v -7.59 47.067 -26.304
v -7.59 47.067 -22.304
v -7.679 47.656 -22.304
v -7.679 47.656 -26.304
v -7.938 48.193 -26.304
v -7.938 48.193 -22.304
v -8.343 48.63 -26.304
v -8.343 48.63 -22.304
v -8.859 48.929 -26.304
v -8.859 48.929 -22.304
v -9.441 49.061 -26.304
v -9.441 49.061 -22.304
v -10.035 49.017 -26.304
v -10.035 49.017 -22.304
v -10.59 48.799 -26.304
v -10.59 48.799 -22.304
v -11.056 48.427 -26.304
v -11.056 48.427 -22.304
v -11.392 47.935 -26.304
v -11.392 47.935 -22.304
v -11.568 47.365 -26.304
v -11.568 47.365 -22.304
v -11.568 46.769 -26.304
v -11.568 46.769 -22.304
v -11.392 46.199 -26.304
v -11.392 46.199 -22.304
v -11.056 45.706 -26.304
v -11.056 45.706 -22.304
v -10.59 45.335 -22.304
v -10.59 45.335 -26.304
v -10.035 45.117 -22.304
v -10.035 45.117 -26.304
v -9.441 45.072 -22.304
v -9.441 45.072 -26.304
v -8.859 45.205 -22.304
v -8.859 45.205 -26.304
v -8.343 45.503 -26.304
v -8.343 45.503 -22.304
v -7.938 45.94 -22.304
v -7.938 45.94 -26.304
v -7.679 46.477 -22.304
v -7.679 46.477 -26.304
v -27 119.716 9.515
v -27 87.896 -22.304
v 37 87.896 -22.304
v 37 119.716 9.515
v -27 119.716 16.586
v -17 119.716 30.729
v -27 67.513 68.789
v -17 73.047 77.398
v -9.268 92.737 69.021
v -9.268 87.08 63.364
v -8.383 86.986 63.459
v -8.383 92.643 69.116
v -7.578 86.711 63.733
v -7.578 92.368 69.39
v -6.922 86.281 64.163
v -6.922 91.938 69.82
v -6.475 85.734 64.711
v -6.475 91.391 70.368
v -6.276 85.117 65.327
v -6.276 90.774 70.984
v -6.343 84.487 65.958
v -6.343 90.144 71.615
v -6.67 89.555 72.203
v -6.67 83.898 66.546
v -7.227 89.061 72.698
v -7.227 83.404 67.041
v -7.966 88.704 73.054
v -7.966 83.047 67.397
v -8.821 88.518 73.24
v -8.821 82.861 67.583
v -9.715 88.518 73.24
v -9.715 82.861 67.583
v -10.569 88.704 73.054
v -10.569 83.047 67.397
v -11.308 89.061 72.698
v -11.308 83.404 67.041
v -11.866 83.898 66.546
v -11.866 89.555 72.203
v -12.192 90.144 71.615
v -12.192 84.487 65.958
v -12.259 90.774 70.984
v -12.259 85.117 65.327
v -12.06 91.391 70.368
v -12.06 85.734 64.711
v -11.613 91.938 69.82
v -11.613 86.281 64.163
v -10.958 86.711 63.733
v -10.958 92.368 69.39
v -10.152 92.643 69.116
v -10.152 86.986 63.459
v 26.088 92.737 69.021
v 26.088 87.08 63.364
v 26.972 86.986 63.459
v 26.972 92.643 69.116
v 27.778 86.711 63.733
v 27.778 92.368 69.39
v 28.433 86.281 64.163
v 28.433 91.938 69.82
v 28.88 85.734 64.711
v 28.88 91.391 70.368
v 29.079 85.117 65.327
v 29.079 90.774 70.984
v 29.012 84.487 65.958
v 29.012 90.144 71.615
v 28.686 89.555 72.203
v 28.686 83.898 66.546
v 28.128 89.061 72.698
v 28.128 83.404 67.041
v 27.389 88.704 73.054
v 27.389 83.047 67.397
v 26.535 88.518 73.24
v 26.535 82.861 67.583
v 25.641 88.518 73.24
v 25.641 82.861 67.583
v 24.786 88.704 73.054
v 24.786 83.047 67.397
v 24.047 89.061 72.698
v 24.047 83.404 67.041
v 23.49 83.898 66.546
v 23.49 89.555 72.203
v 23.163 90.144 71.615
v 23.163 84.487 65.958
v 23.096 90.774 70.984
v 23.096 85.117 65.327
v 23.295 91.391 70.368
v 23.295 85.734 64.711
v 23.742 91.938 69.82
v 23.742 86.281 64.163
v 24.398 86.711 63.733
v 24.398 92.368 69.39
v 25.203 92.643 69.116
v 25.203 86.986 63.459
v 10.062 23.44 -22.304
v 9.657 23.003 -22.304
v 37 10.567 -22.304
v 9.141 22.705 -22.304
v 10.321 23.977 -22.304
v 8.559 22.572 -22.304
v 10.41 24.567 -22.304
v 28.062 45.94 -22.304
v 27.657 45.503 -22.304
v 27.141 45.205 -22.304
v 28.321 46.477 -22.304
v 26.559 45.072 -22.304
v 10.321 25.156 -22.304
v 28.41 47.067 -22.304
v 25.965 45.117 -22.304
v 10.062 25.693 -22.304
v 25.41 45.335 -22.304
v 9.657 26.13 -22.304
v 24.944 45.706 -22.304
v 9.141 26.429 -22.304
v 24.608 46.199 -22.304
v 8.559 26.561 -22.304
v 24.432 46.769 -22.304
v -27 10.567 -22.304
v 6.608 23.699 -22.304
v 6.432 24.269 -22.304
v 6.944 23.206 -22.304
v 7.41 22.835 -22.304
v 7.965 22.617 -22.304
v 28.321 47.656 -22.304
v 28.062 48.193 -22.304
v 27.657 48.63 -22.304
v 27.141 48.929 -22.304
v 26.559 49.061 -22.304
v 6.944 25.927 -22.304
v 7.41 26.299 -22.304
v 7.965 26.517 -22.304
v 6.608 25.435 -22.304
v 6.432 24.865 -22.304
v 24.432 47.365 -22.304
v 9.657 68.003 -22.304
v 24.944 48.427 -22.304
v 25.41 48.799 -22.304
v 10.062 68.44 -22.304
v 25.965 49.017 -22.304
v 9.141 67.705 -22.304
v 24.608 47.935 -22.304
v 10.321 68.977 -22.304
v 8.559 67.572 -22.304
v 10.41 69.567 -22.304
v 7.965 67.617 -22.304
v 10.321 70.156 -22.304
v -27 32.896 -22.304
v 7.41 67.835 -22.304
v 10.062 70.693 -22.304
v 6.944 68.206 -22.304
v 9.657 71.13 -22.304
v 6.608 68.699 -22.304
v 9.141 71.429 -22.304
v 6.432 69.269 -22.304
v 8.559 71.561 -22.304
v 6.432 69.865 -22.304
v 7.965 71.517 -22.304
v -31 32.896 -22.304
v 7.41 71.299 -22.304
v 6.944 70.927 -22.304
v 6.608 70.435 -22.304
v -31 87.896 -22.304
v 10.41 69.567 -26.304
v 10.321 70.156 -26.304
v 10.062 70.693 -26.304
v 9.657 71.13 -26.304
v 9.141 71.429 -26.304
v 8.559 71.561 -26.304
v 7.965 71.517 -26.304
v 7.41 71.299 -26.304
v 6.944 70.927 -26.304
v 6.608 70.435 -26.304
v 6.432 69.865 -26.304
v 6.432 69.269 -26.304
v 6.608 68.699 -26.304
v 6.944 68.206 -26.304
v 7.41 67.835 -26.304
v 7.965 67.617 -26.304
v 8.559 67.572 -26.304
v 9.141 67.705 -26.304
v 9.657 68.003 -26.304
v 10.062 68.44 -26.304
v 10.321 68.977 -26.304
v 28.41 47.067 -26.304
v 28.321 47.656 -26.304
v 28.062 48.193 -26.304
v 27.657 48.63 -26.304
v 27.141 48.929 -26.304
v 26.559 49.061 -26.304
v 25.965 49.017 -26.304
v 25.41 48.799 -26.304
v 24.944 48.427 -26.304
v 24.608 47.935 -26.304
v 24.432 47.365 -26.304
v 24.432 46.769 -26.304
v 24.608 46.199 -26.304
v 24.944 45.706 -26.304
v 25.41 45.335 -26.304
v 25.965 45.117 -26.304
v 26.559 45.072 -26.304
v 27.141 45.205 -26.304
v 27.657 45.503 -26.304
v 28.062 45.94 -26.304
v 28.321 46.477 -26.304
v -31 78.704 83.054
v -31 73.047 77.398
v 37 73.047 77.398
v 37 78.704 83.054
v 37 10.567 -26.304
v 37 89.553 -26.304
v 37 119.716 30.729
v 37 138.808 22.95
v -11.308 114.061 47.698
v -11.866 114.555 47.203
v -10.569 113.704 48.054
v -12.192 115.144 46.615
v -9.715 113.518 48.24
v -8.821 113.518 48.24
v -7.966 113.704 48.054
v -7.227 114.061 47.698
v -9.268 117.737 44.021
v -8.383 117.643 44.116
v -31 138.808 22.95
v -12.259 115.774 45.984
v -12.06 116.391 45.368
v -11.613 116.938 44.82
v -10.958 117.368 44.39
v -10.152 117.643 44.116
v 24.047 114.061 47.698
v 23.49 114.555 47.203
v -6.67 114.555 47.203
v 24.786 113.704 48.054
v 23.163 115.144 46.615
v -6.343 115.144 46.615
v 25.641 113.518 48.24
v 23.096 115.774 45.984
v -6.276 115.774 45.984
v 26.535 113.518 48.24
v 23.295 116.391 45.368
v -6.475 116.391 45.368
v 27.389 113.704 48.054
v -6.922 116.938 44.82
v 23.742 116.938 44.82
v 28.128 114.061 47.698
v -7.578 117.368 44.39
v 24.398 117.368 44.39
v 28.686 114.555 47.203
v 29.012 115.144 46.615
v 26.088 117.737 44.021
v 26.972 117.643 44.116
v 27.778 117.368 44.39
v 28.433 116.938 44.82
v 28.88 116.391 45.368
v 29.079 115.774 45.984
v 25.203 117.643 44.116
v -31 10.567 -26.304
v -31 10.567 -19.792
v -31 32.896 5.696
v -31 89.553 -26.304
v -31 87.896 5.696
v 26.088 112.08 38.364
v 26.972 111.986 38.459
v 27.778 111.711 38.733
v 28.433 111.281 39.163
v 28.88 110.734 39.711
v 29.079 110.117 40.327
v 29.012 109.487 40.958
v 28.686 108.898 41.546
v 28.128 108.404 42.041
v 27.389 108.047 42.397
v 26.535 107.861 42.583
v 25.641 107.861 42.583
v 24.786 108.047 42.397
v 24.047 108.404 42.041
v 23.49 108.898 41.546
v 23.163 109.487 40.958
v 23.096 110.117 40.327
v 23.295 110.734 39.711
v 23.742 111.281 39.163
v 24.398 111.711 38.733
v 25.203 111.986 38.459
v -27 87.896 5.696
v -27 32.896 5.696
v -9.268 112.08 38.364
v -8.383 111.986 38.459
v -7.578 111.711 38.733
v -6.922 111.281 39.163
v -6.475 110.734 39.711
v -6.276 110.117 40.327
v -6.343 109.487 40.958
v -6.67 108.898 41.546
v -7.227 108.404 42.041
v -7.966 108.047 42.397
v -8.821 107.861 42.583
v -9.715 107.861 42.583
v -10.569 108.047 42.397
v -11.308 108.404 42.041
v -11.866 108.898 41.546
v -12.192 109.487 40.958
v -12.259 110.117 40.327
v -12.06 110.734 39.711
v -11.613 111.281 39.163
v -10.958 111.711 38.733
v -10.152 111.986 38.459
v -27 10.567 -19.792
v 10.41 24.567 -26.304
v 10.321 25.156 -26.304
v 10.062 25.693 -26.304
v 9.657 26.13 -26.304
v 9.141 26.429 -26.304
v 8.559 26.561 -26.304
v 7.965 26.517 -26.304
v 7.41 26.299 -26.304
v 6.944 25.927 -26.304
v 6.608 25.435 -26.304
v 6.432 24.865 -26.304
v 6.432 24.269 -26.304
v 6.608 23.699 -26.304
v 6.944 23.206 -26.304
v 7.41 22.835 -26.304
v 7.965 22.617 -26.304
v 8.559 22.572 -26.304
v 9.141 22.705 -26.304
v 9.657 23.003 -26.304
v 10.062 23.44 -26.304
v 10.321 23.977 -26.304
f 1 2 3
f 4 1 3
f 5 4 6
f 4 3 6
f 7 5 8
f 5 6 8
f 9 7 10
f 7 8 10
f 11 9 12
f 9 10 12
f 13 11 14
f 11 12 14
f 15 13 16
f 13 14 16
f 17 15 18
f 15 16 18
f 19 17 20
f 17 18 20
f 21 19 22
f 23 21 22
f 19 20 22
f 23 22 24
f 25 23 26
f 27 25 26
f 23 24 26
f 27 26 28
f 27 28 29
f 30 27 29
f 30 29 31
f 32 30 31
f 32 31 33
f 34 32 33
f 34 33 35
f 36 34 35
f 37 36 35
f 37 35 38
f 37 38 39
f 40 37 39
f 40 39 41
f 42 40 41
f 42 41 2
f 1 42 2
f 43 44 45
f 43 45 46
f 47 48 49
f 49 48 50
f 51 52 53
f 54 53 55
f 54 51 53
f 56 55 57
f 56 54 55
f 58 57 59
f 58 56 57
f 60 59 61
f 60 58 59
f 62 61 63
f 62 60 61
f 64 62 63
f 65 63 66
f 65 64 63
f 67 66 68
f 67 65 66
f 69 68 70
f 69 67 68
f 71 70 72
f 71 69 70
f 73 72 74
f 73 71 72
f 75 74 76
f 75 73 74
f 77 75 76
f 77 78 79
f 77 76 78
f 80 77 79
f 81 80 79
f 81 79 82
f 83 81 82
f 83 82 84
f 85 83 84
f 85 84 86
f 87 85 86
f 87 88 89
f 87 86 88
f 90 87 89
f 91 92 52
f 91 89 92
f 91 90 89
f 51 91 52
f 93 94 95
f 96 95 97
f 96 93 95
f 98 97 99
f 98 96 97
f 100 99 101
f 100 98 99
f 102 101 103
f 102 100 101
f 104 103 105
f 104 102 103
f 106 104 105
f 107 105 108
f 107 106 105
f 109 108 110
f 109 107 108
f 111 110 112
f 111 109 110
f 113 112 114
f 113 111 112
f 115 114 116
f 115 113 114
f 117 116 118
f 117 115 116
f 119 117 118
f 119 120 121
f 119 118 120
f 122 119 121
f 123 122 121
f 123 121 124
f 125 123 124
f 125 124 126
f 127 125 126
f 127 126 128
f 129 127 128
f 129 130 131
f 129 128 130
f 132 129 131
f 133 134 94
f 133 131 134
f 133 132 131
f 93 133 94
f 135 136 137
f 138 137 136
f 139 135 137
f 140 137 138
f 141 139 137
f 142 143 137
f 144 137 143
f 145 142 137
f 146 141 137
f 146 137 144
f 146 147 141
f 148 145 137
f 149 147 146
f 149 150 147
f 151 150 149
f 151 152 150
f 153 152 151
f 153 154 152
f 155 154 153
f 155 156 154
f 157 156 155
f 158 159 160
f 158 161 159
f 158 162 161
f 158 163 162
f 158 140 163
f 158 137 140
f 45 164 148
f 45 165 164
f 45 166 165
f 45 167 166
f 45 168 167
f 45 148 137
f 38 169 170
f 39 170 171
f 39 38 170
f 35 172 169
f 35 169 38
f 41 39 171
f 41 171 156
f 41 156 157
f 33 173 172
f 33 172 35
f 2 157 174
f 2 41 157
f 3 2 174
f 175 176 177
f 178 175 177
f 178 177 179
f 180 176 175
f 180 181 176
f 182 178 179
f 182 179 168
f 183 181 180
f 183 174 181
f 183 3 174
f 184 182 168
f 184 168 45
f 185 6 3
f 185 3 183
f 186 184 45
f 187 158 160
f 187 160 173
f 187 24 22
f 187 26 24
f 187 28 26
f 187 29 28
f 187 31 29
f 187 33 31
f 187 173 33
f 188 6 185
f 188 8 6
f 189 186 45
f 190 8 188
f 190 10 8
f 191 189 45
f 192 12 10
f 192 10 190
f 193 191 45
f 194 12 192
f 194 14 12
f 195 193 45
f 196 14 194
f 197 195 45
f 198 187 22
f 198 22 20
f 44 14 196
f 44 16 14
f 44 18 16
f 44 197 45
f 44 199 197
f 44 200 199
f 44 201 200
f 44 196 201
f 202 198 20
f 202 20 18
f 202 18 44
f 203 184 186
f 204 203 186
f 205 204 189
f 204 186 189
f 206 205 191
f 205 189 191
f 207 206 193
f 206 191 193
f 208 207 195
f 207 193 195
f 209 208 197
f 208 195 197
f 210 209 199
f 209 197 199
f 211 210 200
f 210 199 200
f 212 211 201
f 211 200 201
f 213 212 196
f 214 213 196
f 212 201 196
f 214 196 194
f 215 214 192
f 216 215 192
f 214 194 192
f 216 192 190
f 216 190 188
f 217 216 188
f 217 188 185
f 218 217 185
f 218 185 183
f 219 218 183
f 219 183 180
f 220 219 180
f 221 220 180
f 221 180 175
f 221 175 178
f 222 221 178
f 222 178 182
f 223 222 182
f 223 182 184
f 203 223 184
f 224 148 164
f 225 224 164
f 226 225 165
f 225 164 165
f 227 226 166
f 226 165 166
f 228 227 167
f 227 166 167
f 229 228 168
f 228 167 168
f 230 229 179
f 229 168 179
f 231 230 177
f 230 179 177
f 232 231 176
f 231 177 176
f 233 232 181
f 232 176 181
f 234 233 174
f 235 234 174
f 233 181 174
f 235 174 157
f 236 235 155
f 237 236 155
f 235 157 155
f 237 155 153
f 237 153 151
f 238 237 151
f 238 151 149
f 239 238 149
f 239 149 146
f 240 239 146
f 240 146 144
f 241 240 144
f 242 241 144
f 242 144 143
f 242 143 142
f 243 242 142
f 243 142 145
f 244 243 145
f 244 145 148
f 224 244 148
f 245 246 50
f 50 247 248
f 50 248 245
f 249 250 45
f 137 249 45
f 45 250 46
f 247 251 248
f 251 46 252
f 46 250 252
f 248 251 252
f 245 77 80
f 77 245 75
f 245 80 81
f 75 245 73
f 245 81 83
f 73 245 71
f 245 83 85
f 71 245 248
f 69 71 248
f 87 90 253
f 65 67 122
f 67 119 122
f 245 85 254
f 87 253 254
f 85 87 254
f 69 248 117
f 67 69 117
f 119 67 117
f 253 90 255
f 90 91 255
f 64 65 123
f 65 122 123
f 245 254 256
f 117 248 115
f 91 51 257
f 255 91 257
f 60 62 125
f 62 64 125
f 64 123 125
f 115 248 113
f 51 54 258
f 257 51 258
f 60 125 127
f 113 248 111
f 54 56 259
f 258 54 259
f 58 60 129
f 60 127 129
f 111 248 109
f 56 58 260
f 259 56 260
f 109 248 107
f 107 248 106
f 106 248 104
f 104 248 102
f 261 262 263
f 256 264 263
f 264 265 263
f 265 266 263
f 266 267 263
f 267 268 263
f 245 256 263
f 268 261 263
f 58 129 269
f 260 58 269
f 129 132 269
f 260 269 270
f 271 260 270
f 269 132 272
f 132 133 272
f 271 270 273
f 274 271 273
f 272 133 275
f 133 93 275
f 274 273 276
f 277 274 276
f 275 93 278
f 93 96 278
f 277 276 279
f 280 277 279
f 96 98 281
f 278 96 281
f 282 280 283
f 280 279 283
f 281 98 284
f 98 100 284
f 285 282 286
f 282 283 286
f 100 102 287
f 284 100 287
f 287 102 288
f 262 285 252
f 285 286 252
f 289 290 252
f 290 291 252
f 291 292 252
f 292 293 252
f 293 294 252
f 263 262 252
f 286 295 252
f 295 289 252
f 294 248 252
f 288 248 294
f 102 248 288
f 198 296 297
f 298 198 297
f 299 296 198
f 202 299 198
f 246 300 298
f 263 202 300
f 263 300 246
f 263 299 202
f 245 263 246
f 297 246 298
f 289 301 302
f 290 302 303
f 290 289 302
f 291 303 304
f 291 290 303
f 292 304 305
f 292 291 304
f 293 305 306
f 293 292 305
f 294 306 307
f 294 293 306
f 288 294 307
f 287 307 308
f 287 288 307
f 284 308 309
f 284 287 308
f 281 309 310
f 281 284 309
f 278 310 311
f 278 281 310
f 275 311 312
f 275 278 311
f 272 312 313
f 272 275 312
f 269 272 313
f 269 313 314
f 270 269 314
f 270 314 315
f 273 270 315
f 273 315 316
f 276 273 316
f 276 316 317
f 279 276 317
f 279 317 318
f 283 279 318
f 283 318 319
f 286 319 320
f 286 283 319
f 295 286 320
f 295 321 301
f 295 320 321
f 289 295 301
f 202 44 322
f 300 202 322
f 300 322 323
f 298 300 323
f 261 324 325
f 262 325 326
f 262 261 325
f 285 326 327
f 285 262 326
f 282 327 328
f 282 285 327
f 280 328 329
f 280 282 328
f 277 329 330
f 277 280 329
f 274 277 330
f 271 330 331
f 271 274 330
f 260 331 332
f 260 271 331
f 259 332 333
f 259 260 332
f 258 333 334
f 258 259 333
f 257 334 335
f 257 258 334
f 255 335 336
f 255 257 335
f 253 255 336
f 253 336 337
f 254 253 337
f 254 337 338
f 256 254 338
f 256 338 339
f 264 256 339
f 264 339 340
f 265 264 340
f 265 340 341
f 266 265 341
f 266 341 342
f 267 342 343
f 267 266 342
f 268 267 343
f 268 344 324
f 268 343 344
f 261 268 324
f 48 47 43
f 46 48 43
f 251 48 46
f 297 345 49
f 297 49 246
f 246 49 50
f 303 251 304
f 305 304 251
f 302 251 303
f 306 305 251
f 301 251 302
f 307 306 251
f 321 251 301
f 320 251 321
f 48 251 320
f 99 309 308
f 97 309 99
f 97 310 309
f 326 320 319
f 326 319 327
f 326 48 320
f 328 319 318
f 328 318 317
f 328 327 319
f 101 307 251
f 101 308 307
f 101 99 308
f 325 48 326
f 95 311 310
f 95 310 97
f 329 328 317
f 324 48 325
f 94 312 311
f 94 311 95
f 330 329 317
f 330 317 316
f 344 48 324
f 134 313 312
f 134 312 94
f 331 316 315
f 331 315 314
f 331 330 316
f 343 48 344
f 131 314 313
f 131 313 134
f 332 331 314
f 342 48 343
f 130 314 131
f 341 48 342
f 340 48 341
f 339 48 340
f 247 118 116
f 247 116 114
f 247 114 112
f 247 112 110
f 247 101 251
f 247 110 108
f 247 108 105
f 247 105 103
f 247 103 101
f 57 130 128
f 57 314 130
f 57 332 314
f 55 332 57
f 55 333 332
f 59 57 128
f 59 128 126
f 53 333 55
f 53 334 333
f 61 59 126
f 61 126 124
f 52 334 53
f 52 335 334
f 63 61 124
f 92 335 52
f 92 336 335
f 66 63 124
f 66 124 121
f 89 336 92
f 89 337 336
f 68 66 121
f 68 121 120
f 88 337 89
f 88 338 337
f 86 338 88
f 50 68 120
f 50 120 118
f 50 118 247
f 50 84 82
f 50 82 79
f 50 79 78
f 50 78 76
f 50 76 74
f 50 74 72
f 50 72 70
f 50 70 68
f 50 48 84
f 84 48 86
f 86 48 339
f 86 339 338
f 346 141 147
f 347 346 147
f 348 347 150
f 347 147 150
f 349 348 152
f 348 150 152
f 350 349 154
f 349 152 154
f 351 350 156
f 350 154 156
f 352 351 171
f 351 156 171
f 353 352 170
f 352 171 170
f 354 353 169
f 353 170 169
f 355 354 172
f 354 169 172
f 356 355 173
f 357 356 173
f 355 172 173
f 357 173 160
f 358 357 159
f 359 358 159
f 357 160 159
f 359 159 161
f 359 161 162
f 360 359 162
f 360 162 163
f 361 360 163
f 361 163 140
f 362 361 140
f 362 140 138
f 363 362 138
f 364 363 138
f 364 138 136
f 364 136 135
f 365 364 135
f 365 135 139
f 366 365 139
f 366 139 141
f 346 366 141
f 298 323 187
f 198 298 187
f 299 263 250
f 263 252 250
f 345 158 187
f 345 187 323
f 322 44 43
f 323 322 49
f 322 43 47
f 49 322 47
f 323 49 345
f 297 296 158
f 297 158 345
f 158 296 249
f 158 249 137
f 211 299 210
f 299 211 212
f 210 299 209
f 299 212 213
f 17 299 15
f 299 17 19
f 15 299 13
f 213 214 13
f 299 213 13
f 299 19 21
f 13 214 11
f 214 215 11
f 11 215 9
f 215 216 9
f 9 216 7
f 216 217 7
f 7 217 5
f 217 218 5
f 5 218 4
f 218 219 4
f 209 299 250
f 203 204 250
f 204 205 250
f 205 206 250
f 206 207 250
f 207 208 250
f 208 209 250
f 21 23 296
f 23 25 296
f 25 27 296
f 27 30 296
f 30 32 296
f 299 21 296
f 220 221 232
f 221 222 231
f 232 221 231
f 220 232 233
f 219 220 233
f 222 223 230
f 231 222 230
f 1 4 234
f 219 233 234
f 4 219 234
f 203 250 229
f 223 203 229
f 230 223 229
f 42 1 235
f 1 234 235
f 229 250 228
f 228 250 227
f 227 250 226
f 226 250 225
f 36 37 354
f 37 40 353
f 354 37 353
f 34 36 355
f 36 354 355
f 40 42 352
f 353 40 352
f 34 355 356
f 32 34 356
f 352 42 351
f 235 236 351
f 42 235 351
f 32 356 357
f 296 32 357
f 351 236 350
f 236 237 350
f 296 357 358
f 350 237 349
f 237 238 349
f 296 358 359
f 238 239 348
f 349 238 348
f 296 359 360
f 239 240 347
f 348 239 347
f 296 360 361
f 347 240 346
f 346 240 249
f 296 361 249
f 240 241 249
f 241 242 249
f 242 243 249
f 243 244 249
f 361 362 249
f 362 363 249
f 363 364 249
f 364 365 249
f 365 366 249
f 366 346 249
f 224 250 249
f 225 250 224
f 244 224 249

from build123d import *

# Parameters (mm, degrees)
BOSS_EXTRUDE1_DEPTH      = 37
BOSS_EXTRUDE1_DEPTH_BACK = 27
SKETCH2_R                = 2
CUT_EXTRUDE1_DEPTH       = 179.149132383
BOSS_EXTRUDE2_DEPTH      = 4
CHAMFER1_SIZE            = 15
SKETCH4_R                = 3
CUT_EXTRUDE7_DEPTH       = 20
CHAMFER2_SIZE            = 10


with BuildPart() as part:
    # Sketch1 → Boss-Extrude1 (new, two sides: drawn at the far end of the back side and taken through both)
    with BuildSketch(Plane(origin=(0, 0, 0), x_dir=(0, 0, -1), z_dir=(1, 0, 0)).offset(-BOSS_EXTRUDE1_DEPTH_BACK)):
        Polygon((22.304433561, 10.566780625), (22.304433561, 87.896140672), (-20.12197331, 130.322547544), (-77.397622586, 73.046898267), (-83.054476835, 78.703752517), (-22.950400434, 138.807828918), (26.304433561, 89.552994922), (26.304433561, 10.566780625), align=None)
    extrude(amount=BOSS_EXTRUDE1_DEPTH + BOSS_EXTRUDE1_DEPTH_BACK)

    # Sketch2 → Cut-Extrude1 (cut, through all)
    with BuildSketch(Plane.XY.offset(-22.304433561)):
        with Locations((8.41, 69.566780625)):
            Circle(SKETCH2_R)
        with Locations((26.41, 47.066780625)):
            Circle(SKETCH2_R)
        with Locations((8.41, 24.566780625)):
            Circle(SKETCH2_R)
        with Locations((-9.59, 47.066780625)):
            Circle(SKETCH2_R)
    extrude(amount=-CUT_EXTRUDE1_DEPTH, mode=Mode.SUBTRACT)

    # Sketch12 → Boss-Extrude2 (add)
    with BuildSketch(Plane.ZY.offset(27)):
        Polygon((-22.304433561, 10.566780625), (-19.7923121, 10.566780625), (77.397622586, 73.046898267), (20.12197331, 130.322547544), (-22.304433561, 87.896140672), (5.695566439, 87.896140672), (5.695566439, 32.896140672), (-22.304433561, 32.896140672), align=None)
        Polygon((-26.304433561, 89.552994922), (-26.304433561, 10.566780625), (-22.304433561, 10.566780625), (-22.304433561, 87.896140672), (20.12197331, 130.322547544), (77.397622586, 73.046898267), (83.054476835, 78.703752517), (22.950400434, 138.807828918), align=None)
    extrude(amount=BOSS_EXTRUDE2_DEPTH)

    # Chamfer1
    chamfer1_edges = [part.edges().sort_by_distance(p)[0] for p in [
        (5, 130.322547544, 20.12197331),
    ]]
    chamfer(chamfer1_edges, length=CHAMFER1_SIZE)

    # Sketch4 → Cut-Extrude7 (cut)
    with BuildSketch(Plane(origin=(0, 204.733202838, -42.974973485), x_dir=(1, 0, 0), z_dir=(0, -0.7071067811865472, -0.7071067811865478))):
        with Locations(Location((-9.26766953, 126.031352928, 0), (0, 0, 270))):
            Circle(SKETCH4_R)
        with Locations(Location((-9.26766953, 161.386691988, 0), (0, 0, 270))):
            Circle(SKETCH4_R)
        with Locations(Location((26.08766953, 161.386691988, 0), (0, 0, 270))):
            Circle(SKETCH4_R)
        with Locations(Location((26.08766953, 126.031352928, 0), (0, 0, 270))):
            Circle(SKETCH4_R)
    extrude(amount=CUT_EXTRUDE7_DEPTH, mode=Mode.SUBTRACT)

    # Chamfer2
    chamfer2_edges = [part.edges().sort_by_distance(p)[0] for p in [
        (-27, 96.381422047, 54.063098807),
    ]]
    chamfer(chamfer2_edges, length=CHAMFER2_SIZE)


solid = part.part
